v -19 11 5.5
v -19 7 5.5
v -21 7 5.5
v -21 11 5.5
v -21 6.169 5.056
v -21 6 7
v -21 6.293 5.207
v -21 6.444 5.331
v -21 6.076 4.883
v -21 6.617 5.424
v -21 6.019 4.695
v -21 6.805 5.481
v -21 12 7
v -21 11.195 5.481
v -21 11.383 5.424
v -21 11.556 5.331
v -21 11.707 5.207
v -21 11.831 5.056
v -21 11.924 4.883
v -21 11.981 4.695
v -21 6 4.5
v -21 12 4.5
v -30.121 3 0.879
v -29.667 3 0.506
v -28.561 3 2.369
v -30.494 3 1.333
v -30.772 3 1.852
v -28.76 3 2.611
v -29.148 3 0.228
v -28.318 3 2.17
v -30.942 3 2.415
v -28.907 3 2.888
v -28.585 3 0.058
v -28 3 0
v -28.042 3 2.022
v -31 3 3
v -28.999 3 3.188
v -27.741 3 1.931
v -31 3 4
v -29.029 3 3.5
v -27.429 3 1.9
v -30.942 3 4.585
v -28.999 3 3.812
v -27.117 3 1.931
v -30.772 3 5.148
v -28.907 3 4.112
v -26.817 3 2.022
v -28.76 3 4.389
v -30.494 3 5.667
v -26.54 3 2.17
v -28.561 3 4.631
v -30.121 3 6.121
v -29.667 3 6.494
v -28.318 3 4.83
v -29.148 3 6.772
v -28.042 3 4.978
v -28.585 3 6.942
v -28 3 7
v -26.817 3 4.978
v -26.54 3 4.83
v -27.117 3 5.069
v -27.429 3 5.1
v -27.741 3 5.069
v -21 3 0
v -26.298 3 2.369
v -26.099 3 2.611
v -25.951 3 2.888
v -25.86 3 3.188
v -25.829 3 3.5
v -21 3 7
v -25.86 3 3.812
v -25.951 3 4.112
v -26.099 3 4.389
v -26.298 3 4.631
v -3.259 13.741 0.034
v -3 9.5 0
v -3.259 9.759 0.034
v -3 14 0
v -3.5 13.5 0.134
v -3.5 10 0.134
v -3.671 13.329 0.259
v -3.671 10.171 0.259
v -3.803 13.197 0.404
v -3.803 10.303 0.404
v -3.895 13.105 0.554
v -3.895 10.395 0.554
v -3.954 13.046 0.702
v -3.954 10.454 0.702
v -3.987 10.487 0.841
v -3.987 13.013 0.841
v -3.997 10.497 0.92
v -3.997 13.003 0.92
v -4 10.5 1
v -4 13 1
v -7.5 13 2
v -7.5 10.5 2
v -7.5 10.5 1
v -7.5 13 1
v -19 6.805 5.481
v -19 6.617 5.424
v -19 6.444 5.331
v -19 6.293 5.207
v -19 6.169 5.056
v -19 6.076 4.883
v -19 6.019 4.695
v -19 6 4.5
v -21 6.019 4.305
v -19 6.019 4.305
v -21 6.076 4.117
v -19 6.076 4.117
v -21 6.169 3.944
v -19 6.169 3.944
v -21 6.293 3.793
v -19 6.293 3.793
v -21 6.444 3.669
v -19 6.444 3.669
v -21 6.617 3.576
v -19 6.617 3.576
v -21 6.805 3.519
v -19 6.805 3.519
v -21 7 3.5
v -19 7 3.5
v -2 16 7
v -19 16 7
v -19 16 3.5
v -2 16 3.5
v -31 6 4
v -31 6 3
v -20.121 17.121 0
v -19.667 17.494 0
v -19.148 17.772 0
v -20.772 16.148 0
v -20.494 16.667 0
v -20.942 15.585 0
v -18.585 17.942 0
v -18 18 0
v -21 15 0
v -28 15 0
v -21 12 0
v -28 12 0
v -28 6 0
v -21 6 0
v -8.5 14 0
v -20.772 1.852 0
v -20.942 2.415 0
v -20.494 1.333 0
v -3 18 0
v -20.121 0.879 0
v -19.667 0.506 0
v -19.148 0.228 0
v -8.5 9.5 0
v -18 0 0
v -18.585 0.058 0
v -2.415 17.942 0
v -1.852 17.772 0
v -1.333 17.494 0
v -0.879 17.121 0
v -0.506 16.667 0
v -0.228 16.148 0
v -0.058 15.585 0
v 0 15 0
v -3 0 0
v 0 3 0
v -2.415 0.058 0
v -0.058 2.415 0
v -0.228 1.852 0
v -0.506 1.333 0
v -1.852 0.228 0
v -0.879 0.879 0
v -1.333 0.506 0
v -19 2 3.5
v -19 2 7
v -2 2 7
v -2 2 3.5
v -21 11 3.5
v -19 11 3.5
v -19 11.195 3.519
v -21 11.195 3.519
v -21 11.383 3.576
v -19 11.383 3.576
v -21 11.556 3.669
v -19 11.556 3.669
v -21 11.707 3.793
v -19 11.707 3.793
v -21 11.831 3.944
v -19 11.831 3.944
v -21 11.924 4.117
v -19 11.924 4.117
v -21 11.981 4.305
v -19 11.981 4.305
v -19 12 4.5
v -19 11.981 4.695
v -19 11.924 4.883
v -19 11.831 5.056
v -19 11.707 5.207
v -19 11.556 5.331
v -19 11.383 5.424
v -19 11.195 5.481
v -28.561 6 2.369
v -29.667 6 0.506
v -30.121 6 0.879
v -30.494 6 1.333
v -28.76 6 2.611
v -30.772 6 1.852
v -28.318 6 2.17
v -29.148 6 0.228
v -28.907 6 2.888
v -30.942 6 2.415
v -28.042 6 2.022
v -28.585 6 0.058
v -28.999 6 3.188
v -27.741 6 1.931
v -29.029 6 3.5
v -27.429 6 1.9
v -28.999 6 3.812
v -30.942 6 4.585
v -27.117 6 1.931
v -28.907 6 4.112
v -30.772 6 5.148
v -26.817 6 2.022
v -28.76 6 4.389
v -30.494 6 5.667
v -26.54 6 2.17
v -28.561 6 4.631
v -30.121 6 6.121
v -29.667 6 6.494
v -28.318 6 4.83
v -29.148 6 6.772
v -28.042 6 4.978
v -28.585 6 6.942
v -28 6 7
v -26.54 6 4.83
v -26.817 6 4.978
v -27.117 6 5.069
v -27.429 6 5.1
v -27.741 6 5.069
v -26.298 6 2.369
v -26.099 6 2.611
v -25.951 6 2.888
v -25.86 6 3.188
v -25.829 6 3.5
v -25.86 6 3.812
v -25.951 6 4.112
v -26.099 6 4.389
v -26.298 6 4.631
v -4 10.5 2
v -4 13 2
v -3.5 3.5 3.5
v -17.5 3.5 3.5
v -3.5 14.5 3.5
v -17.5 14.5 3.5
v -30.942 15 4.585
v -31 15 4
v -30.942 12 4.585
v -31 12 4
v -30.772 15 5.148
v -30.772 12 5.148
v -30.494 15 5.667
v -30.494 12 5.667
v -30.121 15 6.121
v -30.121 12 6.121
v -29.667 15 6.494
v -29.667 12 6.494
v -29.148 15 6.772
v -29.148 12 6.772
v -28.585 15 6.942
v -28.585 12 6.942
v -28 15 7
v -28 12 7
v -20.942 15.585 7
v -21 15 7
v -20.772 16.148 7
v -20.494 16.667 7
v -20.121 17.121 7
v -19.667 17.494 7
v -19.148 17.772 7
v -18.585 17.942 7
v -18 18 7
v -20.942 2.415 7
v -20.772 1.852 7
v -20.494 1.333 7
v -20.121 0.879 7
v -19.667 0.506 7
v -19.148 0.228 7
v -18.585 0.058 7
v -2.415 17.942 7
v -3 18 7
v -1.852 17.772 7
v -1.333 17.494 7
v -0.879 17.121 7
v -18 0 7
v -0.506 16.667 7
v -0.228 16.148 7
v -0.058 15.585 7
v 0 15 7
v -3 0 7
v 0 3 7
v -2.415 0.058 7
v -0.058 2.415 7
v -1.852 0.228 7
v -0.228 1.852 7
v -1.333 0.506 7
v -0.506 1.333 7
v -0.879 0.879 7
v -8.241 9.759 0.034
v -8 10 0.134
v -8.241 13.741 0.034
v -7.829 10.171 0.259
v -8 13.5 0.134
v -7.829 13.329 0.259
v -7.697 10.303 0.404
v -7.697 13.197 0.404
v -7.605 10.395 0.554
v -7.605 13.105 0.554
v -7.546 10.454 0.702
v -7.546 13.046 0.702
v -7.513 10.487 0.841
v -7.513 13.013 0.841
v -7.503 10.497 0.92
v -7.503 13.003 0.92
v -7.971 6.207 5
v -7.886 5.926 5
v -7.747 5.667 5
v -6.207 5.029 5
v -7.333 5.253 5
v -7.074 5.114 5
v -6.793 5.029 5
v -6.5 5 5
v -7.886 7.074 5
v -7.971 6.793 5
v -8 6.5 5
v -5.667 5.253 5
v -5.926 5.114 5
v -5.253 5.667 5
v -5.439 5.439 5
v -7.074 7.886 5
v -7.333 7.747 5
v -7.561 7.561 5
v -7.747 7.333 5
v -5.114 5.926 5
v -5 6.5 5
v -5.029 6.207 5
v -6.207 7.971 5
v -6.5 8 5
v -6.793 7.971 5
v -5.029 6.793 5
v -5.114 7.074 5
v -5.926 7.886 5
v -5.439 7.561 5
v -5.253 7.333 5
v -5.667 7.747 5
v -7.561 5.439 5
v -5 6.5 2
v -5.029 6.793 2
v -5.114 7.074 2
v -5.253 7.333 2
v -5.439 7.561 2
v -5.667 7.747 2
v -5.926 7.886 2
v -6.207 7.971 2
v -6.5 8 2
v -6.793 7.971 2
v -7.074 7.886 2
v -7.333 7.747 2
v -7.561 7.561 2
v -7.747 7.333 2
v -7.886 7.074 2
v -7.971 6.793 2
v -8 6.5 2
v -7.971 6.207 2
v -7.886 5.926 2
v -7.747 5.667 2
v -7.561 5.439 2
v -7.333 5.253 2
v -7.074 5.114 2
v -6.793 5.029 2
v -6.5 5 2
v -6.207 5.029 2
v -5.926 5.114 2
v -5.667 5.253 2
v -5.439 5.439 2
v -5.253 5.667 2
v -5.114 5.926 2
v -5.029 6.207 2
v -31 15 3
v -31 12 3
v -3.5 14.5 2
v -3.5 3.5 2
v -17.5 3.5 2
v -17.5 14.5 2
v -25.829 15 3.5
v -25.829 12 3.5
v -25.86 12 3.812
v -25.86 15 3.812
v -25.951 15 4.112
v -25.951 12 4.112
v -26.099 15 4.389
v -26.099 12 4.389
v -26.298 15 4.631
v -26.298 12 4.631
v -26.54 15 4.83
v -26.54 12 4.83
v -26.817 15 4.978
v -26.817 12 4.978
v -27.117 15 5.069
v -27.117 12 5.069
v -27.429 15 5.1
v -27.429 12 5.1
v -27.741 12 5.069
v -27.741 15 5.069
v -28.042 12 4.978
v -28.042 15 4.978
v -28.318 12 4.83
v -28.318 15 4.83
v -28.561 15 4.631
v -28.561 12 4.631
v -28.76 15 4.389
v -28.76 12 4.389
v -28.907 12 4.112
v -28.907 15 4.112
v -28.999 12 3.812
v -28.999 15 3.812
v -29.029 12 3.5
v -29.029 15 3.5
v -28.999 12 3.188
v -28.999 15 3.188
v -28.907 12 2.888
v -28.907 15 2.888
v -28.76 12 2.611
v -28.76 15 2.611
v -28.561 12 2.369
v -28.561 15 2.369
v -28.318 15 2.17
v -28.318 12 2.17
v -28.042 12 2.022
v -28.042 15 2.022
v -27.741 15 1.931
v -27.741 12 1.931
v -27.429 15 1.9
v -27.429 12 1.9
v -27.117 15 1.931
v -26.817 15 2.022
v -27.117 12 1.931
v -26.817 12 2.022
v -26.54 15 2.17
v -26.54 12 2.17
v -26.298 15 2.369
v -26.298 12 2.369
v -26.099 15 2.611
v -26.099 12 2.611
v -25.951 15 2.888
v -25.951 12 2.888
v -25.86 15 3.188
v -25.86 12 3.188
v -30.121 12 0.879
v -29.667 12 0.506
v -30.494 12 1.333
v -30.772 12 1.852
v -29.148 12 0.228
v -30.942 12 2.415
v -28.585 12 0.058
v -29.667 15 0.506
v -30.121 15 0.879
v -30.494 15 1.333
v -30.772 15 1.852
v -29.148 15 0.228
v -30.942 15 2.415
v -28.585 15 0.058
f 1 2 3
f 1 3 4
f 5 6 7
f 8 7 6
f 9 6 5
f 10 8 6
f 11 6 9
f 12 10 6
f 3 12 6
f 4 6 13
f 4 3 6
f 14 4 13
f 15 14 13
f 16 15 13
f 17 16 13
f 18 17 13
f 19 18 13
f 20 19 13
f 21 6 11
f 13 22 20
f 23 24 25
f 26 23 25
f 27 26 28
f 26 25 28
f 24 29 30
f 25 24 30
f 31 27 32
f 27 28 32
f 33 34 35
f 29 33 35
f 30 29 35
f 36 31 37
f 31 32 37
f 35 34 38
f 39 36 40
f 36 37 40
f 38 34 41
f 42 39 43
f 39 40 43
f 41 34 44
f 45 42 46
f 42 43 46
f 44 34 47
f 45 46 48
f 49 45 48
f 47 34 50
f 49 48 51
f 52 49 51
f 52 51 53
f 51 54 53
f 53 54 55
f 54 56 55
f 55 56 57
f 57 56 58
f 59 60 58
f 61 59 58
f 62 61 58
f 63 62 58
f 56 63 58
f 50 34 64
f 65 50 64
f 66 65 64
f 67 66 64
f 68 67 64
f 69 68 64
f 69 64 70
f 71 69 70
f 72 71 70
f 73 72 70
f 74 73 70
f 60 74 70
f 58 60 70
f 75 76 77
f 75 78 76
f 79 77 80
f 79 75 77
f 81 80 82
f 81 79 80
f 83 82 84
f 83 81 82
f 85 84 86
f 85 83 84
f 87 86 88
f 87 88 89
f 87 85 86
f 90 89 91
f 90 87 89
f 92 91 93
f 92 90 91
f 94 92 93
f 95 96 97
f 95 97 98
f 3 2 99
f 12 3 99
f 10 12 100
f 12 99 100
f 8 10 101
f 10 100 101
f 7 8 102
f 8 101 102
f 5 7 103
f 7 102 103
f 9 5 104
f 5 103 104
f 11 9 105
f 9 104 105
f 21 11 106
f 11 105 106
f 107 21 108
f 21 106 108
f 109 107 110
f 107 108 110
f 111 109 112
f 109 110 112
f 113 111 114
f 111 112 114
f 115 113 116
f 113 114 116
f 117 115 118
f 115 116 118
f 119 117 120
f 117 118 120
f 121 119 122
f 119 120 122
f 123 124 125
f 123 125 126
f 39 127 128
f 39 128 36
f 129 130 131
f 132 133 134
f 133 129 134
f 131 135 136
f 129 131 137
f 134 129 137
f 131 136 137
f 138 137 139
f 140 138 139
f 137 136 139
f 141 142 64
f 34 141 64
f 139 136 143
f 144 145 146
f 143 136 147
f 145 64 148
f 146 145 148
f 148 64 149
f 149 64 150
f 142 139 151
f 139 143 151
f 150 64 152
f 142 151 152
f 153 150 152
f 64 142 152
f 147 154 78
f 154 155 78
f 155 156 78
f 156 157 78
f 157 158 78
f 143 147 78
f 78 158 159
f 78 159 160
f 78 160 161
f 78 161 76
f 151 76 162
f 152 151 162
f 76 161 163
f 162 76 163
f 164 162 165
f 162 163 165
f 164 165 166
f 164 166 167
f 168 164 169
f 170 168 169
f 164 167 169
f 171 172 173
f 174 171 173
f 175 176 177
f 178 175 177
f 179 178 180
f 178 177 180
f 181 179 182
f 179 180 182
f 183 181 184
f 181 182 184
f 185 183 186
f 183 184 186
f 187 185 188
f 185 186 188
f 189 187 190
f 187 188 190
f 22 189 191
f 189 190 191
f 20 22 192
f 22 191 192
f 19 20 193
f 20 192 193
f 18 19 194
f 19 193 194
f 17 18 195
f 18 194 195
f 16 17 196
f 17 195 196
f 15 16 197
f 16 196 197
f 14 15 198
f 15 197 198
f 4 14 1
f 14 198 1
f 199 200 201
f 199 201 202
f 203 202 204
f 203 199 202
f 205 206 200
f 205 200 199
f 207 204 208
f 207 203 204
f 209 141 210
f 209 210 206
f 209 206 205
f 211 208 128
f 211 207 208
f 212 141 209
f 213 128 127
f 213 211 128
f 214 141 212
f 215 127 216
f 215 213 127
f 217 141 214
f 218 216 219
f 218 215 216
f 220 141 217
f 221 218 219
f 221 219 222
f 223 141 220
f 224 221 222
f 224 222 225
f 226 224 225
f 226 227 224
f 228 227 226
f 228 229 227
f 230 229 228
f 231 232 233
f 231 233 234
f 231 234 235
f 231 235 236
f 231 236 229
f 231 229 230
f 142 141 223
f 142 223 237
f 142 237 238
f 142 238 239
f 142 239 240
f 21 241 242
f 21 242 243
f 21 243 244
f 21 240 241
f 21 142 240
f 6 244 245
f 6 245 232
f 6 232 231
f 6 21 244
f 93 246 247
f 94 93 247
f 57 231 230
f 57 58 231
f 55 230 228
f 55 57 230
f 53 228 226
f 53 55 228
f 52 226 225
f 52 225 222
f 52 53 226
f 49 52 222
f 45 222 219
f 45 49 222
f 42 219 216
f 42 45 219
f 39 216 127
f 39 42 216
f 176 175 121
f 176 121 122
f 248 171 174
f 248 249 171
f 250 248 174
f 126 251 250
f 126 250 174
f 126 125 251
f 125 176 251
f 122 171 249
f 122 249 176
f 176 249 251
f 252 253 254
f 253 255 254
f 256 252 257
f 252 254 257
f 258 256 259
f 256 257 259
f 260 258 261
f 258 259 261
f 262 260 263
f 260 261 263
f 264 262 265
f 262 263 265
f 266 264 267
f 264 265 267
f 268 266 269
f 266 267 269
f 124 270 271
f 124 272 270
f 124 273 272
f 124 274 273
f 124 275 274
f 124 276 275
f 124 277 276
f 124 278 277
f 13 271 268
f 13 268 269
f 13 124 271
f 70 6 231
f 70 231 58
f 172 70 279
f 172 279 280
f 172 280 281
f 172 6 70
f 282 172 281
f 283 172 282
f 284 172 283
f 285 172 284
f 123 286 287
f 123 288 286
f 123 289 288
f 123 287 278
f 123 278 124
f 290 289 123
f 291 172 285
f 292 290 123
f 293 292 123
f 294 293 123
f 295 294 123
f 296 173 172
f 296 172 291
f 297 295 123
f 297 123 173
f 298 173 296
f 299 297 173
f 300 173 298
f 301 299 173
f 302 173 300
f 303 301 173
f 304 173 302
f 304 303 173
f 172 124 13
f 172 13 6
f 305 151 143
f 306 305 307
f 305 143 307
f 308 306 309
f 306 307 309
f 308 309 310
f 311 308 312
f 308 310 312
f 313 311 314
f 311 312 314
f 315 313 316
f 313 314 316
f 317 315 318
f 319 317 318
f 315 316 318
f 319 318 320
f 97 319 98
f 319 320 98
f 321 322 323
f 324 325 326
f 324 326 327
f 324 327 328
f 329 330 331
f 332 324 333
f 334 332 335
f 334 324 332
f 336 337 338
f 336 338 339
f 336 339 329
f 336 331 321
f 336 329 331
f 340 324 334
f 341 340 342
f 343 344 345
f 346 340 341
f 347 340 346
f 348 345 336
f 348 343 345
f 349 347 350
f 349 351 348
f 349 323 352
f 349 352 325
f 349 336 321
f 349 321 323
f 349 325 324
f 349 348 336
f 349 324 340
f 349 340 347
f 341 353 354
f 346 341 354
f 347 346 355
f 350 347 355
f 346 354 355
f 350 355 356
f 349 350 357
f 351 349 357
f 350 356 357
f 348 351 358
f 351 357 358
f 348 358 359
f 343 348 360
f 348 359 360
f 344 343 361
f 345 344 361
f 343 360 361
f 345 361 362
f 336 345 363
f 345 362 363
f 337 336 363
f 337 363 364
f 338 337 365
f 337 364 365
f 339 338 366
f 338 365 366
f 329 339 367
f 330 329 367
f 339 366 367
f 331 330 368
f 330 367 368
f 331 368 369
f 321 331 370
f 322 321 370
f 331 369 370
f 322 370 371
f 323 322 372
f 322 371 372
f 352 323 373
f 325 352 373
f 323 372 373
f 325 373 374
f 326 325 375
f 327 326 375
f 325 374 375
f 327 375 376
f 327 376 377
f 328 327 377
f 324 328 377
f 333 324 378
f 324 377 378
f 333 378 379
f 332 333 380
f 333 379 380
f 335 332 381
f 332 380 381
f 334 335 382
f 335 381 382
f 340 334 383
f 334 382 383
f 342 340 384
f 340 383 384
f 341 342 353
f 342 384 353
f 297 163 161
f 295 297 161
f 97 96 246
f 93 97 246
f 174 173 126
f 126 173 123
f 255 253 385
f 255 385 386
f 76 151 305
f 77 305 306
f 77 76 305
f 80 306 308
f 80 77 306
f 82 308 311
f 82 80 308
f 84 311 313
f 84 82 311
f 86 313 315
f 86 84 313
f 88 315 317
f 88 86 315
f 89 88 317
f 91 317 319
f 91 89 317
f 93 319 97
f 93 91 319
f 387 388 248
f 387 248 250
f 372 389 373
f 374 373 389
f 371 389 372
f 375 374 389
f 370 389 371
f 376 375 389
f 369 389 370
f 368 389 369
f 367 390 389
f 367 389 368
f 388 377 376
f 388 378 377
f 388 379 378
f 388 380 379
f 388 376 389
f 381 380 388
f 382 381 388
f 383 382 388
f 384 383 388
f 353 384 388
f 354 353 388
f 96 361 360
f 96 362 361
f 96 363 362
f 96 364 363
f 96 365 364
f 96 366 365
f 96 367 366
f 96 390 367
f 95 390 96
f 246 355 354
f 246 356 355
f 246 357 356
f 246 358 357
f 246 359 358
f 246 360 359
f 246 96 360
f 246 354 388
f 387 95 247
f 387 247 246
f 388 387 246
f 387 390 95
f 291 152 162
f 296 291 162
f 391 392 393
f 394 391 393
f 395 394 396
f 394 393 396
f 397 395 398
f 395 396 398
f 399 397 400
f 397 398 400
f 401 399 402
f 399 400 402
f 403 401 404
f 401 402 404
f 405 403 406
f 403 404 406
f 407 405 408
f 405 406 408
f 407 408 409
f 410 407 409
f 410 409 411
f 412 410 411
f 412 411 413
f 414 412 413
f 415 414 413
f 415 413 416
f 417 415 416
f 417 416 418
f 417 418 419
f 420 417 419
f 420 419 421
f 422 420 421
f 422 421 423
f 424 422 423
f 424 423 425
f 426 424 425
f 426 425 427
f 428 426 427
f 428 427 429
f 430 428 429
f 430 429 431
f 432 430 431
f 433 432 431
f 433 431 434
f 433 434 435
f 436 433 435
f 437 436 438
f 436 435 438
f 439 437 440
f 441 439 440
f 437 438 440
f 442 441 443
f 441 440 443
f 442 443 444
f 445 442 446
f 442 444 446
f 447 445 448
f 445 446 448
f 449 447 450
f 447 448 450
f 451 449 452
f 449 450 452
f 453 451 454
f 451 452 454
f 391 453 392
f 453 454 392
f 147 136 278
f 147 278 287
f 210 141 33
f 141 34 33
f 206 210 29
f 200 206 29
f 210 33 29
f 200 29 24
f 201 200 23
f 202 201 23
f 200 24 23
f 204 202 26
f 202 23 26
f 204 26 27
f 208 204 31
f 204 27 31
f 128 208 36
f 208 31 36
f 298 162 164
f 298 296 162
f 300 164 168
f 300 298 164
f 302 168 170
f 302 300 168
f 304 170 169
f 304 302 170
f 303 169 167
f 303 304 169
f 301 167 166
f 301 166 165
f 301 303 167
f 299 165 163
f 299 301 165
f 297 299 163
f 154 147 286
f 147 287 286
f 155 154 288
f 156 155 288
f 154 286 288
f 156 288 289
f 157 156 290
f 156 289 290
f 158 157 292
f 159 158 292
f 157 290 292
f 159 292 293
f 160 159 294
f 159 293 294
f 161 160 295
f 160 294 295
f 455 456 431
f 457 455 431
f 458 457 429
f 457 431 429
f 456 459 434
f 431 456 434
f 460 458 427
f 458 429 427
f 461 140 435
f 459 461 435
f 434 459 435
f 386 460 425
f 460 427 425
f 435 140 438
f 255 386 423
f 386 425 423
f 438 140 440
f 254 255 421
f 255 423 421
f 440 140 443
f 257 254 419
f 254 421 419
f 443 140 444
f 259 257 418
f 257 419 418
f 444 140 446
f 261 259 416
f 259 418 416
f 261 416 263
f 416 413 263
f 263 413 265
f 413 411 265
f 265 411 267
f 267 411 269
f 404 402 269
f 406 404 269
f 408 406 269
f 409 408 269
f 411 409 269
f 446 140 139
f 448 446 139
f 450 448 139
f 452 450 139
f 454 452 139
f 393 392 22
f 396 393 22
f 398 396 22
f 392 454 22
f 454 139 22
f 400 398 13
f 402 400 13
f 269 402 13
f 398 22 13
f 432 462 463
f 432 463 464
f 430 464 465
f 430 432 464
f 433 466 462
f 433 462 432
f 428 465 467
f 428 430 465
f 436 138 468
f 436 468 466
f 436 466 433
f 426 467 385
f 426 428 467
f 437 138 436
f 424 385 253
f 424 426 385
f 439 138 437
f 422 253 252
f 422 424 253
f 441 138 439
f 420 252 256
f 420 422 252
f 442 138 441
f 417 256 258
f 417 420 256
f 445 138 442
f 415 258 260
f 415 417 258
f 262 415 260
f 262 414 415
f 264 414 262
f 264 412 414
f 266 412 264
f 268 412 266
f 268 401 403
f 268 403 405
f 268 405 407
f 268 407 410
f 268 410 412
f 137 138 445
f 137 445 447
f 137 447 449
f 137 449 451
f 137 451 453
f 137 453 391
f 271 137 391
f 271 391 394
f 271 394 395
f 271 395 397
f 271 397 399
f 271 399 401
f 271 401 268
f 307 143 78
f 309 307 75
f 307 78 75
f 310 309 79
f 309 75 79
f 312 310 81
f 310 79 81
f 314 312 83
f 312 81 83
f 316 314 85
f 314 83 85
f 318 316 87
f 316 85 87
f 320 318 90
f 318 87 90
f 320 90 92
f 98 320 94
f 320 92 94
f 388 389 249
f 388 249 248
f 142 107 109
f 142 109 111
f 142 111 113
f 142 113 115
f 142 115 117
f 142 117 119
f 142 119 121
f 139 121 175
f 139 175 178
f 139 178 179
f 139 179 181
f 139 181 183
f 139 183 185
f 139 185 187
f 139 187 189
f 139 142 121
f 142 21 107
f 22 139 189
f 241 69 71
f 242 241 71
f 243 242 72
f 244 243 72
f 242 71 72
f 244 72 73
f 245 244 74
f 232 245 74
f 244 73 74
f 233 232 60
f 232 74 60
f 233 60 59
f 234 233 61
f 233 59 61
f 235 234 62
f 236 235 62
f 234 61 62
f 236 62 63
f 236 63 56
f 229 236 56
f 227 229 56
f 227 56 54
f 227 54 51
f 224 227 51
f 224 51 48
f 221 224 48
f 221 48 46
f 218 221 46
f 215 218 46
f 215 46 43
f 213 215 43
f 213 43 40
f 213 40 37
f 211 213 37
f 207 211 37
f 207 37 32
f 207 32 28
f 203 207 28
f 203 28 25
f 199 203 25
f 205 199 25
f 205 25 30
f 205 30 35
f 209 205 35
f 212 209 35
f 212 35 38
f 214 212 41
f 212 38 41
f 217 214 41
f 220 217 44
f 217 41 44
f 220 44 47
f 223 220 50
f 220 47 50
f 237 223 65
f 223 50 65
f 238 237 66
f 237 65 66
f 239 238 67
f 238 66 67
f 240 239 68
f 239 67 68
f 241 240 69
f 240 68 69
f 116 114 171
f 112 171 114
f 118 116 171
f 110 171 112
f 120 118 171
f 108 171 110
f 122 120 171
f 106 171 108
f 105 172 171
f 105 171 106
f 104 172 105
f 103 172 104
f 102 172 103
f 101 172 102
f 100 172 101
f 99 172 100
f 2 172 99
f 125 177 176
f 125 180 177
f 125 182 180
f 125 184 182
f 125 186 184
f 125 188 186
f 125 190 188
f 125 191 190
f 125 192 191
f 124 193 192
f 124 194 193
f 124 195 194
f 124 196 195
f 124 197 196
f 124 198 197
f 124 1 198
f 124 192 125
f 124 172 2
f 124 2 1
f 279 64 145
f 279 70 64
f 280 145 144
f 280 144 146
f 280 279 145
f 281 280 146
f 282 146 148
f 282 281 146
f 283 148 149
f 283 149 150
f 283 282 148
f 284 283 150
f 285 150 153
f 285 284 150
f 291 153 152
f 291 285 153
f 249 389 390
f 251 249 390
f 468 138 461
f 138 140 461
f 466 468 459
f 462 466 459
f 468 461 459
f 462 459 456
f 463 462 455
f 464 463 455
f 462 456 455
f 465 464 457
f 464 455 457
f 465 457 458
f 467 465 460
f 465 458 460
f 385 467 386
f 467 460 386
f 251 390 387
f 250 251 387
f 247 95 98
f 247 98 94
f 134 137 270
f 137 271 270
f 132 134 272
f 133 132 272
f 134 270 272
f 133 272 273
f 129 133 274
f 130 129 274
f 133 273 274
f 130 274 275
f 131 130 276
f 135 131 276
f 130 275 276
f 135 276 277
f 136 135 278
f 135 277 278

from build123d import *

# Parameters (mm, degrees)
SKETCH_W        = 21
SKETCH_H        = 18
PAD_DEPTH       = 7
SKETCH001_W     = 17
SKETCH001_H     = 14
POCKET_DEPTH    = 5
SKETCH003_W     = 17
SKETCH003_H     = 1.5
PAD001_DEPTH    = 1.5
SKETCH004_W     = 1.5
SKETCH004_H     = 11
PAD002_DEPTH    = 1.5
POCKET001_DEPTH = 5
FILLET_R        = 3
SKETCH006_W     = 3.5
SKETCH006_H     = 2.5
POCKET002_DEPTH = 5
SKETCH007_R     = 1.5
PAD003_DEPTH    = 3
SKETCH008_W     = 3
SKETCH008_H     = 7
PAD004_DEPTH    = 10
SKETCH009_R     = 1.6
POCKET003_DEPTH = 15.001
FILLET001_R     = 3
FILLET002_R     = 1


with BuildPart() as part:
    # Sketch → Pad (new body)
    with BuildSketch(Plane.XY):
        with Locations((-10.5, 9)):
            Rectangle(SKETCH_W, SKETCH_H)
    extrude(amount=PAD_DEPTH)

    # Sketch001 (on Face6 of Pad) → Pocket (cut)
    with BuildSketch(Plane.XY.offset(7)):
        with Locations((-10.5, 9)):
            Rectangle(SKETCH001_W, SKETCH001_H)
    extrude(amount=-POCKET_DEPTH, mode=Mode.SUBTRACT)

    # Sketch003 (on Face11 of Pocket) → Pad001 (join)
    with BuildSketch(Plane.XY.offset(2)):
        with Locations((-10.5, 15.25)):
            Rectangle(SKETCH003_W, SKETCH003_H)
        with Locations((-10.5, 2.75)):
            Rectangle(SKETCH003_W, SKETCH003_H)
    extrude(amount=PAD001_DEPTH)

    # Sketch004 (on Face14 of Pad001) → Pad002 (join)
    with BuildSketch(Plane.XY.offset(2)):
        with Locations((-18.25, 9)):
            Rectangle(SKETCH004_W, SKETCH004_H)
        with Locations((-2.75, 9)):
            Rectangle(SKETCH004_W, SKETCH004_H)
    extrude(amount=PAD002_DEPTH)

    # Sketch005 (on Face10 of Pad002) → Pocket001 (cut)
    with BuildSketch(Plane.YZ.offset(-19)):
        with BuildLine():
            ThreePointArc((7, 5.5), (6, 4.5), (7, 3.5))
            Line((7, 3.5), (11, 3.5))
            ThreePointArc((11, 3.5), (12, 4.5), (11, 5.5))
            Line((7, 5.5), (11, 5.5))
        make_face()
    extrude(amount=-POCKET001_DEPTH, mode=Mode.SUBTRACT)

    # Fillet
    fillet_edges = [part.edges().sort_by_distance(p)[0] for p in [
        (0, 0, 3.5),
        (-21, 0, 3.5),
        (-21, 18, 3.5),
        (0, 18, 3.5),
    ]]
    fillet(fillet_edges, radius=FILLET_R)

    # Sketch006 (on Face23 of Pocket001) → Pocket002 (cut)
    with BuildSketch(Plane.XY.offset(2)):
        with Locations((-5.75, 11.75)):
            Rectangle(SKETCH006_W, SKETCH006_H)
    extrude(amount=-POCKET002_DEPTH, mode=Mode.SUBTRACT)

    # Sketch007 (on Face23 of Pocket002) → Pad003 (join)
    with BuildSketch(Plane.XY.offset(2)):
        with Locations((-6.5, 6.5)):
            Circle(SKETCH007_R)
    extrude(amount=PAD003_DEPTH)

    # Sketch008 (on Face7 of Pad003) → Pad004 (join)
    with BuildSketch(Plane(origin=(-21, 0, 0), x_dir=(0, -1, 0), z_dir=(-1, 0, 0))):
        with Locations((-13.5, 3.5)):
            Rectangle(SKETCH008_W, SKETCH008_H)
        with Locations((-4.5, 3.5)):
            Rectangle(SKETCH008_W, SKETCH008_H)
    extrude(amount=PAD004_DEPTH)

    # Sketch009 (on Face17 of Pad004) → Pocket003 (cut, through all)
    with BuildSketch(Plane.XZ.offset(-3)):
        with Locations((-27.429286, 3.5)):
            Circle(SKETCH009_R)
    extrude(amount=-POCKET003_DEPTH, mode=Mode.SUBTRACT)

    # Fillet001
    fillet001_edges = [part.edges().sort_by_distance(p)[0] for p in [
        (-31, 4.5, 7),
        (-31, 4.5, 0),
        (-31, 13.5, 0),
        (-31, 13.5, 7),
    ]]
    fillet(fillet001_edges, radius=FILLET001_R)

    # Fillet002
    fillet002_edges = [part.edges().sort_by_distance(p)[0] for p in [
        (-5.75, 13, 0),
        (-7.5, 11.75, 0),
        (-5.75, 10.5, 0),
        (-4, 11.75, 0),
    ]]
    fillet(fillet002_edges, radius=FILLET002_R)


solid = part.part
